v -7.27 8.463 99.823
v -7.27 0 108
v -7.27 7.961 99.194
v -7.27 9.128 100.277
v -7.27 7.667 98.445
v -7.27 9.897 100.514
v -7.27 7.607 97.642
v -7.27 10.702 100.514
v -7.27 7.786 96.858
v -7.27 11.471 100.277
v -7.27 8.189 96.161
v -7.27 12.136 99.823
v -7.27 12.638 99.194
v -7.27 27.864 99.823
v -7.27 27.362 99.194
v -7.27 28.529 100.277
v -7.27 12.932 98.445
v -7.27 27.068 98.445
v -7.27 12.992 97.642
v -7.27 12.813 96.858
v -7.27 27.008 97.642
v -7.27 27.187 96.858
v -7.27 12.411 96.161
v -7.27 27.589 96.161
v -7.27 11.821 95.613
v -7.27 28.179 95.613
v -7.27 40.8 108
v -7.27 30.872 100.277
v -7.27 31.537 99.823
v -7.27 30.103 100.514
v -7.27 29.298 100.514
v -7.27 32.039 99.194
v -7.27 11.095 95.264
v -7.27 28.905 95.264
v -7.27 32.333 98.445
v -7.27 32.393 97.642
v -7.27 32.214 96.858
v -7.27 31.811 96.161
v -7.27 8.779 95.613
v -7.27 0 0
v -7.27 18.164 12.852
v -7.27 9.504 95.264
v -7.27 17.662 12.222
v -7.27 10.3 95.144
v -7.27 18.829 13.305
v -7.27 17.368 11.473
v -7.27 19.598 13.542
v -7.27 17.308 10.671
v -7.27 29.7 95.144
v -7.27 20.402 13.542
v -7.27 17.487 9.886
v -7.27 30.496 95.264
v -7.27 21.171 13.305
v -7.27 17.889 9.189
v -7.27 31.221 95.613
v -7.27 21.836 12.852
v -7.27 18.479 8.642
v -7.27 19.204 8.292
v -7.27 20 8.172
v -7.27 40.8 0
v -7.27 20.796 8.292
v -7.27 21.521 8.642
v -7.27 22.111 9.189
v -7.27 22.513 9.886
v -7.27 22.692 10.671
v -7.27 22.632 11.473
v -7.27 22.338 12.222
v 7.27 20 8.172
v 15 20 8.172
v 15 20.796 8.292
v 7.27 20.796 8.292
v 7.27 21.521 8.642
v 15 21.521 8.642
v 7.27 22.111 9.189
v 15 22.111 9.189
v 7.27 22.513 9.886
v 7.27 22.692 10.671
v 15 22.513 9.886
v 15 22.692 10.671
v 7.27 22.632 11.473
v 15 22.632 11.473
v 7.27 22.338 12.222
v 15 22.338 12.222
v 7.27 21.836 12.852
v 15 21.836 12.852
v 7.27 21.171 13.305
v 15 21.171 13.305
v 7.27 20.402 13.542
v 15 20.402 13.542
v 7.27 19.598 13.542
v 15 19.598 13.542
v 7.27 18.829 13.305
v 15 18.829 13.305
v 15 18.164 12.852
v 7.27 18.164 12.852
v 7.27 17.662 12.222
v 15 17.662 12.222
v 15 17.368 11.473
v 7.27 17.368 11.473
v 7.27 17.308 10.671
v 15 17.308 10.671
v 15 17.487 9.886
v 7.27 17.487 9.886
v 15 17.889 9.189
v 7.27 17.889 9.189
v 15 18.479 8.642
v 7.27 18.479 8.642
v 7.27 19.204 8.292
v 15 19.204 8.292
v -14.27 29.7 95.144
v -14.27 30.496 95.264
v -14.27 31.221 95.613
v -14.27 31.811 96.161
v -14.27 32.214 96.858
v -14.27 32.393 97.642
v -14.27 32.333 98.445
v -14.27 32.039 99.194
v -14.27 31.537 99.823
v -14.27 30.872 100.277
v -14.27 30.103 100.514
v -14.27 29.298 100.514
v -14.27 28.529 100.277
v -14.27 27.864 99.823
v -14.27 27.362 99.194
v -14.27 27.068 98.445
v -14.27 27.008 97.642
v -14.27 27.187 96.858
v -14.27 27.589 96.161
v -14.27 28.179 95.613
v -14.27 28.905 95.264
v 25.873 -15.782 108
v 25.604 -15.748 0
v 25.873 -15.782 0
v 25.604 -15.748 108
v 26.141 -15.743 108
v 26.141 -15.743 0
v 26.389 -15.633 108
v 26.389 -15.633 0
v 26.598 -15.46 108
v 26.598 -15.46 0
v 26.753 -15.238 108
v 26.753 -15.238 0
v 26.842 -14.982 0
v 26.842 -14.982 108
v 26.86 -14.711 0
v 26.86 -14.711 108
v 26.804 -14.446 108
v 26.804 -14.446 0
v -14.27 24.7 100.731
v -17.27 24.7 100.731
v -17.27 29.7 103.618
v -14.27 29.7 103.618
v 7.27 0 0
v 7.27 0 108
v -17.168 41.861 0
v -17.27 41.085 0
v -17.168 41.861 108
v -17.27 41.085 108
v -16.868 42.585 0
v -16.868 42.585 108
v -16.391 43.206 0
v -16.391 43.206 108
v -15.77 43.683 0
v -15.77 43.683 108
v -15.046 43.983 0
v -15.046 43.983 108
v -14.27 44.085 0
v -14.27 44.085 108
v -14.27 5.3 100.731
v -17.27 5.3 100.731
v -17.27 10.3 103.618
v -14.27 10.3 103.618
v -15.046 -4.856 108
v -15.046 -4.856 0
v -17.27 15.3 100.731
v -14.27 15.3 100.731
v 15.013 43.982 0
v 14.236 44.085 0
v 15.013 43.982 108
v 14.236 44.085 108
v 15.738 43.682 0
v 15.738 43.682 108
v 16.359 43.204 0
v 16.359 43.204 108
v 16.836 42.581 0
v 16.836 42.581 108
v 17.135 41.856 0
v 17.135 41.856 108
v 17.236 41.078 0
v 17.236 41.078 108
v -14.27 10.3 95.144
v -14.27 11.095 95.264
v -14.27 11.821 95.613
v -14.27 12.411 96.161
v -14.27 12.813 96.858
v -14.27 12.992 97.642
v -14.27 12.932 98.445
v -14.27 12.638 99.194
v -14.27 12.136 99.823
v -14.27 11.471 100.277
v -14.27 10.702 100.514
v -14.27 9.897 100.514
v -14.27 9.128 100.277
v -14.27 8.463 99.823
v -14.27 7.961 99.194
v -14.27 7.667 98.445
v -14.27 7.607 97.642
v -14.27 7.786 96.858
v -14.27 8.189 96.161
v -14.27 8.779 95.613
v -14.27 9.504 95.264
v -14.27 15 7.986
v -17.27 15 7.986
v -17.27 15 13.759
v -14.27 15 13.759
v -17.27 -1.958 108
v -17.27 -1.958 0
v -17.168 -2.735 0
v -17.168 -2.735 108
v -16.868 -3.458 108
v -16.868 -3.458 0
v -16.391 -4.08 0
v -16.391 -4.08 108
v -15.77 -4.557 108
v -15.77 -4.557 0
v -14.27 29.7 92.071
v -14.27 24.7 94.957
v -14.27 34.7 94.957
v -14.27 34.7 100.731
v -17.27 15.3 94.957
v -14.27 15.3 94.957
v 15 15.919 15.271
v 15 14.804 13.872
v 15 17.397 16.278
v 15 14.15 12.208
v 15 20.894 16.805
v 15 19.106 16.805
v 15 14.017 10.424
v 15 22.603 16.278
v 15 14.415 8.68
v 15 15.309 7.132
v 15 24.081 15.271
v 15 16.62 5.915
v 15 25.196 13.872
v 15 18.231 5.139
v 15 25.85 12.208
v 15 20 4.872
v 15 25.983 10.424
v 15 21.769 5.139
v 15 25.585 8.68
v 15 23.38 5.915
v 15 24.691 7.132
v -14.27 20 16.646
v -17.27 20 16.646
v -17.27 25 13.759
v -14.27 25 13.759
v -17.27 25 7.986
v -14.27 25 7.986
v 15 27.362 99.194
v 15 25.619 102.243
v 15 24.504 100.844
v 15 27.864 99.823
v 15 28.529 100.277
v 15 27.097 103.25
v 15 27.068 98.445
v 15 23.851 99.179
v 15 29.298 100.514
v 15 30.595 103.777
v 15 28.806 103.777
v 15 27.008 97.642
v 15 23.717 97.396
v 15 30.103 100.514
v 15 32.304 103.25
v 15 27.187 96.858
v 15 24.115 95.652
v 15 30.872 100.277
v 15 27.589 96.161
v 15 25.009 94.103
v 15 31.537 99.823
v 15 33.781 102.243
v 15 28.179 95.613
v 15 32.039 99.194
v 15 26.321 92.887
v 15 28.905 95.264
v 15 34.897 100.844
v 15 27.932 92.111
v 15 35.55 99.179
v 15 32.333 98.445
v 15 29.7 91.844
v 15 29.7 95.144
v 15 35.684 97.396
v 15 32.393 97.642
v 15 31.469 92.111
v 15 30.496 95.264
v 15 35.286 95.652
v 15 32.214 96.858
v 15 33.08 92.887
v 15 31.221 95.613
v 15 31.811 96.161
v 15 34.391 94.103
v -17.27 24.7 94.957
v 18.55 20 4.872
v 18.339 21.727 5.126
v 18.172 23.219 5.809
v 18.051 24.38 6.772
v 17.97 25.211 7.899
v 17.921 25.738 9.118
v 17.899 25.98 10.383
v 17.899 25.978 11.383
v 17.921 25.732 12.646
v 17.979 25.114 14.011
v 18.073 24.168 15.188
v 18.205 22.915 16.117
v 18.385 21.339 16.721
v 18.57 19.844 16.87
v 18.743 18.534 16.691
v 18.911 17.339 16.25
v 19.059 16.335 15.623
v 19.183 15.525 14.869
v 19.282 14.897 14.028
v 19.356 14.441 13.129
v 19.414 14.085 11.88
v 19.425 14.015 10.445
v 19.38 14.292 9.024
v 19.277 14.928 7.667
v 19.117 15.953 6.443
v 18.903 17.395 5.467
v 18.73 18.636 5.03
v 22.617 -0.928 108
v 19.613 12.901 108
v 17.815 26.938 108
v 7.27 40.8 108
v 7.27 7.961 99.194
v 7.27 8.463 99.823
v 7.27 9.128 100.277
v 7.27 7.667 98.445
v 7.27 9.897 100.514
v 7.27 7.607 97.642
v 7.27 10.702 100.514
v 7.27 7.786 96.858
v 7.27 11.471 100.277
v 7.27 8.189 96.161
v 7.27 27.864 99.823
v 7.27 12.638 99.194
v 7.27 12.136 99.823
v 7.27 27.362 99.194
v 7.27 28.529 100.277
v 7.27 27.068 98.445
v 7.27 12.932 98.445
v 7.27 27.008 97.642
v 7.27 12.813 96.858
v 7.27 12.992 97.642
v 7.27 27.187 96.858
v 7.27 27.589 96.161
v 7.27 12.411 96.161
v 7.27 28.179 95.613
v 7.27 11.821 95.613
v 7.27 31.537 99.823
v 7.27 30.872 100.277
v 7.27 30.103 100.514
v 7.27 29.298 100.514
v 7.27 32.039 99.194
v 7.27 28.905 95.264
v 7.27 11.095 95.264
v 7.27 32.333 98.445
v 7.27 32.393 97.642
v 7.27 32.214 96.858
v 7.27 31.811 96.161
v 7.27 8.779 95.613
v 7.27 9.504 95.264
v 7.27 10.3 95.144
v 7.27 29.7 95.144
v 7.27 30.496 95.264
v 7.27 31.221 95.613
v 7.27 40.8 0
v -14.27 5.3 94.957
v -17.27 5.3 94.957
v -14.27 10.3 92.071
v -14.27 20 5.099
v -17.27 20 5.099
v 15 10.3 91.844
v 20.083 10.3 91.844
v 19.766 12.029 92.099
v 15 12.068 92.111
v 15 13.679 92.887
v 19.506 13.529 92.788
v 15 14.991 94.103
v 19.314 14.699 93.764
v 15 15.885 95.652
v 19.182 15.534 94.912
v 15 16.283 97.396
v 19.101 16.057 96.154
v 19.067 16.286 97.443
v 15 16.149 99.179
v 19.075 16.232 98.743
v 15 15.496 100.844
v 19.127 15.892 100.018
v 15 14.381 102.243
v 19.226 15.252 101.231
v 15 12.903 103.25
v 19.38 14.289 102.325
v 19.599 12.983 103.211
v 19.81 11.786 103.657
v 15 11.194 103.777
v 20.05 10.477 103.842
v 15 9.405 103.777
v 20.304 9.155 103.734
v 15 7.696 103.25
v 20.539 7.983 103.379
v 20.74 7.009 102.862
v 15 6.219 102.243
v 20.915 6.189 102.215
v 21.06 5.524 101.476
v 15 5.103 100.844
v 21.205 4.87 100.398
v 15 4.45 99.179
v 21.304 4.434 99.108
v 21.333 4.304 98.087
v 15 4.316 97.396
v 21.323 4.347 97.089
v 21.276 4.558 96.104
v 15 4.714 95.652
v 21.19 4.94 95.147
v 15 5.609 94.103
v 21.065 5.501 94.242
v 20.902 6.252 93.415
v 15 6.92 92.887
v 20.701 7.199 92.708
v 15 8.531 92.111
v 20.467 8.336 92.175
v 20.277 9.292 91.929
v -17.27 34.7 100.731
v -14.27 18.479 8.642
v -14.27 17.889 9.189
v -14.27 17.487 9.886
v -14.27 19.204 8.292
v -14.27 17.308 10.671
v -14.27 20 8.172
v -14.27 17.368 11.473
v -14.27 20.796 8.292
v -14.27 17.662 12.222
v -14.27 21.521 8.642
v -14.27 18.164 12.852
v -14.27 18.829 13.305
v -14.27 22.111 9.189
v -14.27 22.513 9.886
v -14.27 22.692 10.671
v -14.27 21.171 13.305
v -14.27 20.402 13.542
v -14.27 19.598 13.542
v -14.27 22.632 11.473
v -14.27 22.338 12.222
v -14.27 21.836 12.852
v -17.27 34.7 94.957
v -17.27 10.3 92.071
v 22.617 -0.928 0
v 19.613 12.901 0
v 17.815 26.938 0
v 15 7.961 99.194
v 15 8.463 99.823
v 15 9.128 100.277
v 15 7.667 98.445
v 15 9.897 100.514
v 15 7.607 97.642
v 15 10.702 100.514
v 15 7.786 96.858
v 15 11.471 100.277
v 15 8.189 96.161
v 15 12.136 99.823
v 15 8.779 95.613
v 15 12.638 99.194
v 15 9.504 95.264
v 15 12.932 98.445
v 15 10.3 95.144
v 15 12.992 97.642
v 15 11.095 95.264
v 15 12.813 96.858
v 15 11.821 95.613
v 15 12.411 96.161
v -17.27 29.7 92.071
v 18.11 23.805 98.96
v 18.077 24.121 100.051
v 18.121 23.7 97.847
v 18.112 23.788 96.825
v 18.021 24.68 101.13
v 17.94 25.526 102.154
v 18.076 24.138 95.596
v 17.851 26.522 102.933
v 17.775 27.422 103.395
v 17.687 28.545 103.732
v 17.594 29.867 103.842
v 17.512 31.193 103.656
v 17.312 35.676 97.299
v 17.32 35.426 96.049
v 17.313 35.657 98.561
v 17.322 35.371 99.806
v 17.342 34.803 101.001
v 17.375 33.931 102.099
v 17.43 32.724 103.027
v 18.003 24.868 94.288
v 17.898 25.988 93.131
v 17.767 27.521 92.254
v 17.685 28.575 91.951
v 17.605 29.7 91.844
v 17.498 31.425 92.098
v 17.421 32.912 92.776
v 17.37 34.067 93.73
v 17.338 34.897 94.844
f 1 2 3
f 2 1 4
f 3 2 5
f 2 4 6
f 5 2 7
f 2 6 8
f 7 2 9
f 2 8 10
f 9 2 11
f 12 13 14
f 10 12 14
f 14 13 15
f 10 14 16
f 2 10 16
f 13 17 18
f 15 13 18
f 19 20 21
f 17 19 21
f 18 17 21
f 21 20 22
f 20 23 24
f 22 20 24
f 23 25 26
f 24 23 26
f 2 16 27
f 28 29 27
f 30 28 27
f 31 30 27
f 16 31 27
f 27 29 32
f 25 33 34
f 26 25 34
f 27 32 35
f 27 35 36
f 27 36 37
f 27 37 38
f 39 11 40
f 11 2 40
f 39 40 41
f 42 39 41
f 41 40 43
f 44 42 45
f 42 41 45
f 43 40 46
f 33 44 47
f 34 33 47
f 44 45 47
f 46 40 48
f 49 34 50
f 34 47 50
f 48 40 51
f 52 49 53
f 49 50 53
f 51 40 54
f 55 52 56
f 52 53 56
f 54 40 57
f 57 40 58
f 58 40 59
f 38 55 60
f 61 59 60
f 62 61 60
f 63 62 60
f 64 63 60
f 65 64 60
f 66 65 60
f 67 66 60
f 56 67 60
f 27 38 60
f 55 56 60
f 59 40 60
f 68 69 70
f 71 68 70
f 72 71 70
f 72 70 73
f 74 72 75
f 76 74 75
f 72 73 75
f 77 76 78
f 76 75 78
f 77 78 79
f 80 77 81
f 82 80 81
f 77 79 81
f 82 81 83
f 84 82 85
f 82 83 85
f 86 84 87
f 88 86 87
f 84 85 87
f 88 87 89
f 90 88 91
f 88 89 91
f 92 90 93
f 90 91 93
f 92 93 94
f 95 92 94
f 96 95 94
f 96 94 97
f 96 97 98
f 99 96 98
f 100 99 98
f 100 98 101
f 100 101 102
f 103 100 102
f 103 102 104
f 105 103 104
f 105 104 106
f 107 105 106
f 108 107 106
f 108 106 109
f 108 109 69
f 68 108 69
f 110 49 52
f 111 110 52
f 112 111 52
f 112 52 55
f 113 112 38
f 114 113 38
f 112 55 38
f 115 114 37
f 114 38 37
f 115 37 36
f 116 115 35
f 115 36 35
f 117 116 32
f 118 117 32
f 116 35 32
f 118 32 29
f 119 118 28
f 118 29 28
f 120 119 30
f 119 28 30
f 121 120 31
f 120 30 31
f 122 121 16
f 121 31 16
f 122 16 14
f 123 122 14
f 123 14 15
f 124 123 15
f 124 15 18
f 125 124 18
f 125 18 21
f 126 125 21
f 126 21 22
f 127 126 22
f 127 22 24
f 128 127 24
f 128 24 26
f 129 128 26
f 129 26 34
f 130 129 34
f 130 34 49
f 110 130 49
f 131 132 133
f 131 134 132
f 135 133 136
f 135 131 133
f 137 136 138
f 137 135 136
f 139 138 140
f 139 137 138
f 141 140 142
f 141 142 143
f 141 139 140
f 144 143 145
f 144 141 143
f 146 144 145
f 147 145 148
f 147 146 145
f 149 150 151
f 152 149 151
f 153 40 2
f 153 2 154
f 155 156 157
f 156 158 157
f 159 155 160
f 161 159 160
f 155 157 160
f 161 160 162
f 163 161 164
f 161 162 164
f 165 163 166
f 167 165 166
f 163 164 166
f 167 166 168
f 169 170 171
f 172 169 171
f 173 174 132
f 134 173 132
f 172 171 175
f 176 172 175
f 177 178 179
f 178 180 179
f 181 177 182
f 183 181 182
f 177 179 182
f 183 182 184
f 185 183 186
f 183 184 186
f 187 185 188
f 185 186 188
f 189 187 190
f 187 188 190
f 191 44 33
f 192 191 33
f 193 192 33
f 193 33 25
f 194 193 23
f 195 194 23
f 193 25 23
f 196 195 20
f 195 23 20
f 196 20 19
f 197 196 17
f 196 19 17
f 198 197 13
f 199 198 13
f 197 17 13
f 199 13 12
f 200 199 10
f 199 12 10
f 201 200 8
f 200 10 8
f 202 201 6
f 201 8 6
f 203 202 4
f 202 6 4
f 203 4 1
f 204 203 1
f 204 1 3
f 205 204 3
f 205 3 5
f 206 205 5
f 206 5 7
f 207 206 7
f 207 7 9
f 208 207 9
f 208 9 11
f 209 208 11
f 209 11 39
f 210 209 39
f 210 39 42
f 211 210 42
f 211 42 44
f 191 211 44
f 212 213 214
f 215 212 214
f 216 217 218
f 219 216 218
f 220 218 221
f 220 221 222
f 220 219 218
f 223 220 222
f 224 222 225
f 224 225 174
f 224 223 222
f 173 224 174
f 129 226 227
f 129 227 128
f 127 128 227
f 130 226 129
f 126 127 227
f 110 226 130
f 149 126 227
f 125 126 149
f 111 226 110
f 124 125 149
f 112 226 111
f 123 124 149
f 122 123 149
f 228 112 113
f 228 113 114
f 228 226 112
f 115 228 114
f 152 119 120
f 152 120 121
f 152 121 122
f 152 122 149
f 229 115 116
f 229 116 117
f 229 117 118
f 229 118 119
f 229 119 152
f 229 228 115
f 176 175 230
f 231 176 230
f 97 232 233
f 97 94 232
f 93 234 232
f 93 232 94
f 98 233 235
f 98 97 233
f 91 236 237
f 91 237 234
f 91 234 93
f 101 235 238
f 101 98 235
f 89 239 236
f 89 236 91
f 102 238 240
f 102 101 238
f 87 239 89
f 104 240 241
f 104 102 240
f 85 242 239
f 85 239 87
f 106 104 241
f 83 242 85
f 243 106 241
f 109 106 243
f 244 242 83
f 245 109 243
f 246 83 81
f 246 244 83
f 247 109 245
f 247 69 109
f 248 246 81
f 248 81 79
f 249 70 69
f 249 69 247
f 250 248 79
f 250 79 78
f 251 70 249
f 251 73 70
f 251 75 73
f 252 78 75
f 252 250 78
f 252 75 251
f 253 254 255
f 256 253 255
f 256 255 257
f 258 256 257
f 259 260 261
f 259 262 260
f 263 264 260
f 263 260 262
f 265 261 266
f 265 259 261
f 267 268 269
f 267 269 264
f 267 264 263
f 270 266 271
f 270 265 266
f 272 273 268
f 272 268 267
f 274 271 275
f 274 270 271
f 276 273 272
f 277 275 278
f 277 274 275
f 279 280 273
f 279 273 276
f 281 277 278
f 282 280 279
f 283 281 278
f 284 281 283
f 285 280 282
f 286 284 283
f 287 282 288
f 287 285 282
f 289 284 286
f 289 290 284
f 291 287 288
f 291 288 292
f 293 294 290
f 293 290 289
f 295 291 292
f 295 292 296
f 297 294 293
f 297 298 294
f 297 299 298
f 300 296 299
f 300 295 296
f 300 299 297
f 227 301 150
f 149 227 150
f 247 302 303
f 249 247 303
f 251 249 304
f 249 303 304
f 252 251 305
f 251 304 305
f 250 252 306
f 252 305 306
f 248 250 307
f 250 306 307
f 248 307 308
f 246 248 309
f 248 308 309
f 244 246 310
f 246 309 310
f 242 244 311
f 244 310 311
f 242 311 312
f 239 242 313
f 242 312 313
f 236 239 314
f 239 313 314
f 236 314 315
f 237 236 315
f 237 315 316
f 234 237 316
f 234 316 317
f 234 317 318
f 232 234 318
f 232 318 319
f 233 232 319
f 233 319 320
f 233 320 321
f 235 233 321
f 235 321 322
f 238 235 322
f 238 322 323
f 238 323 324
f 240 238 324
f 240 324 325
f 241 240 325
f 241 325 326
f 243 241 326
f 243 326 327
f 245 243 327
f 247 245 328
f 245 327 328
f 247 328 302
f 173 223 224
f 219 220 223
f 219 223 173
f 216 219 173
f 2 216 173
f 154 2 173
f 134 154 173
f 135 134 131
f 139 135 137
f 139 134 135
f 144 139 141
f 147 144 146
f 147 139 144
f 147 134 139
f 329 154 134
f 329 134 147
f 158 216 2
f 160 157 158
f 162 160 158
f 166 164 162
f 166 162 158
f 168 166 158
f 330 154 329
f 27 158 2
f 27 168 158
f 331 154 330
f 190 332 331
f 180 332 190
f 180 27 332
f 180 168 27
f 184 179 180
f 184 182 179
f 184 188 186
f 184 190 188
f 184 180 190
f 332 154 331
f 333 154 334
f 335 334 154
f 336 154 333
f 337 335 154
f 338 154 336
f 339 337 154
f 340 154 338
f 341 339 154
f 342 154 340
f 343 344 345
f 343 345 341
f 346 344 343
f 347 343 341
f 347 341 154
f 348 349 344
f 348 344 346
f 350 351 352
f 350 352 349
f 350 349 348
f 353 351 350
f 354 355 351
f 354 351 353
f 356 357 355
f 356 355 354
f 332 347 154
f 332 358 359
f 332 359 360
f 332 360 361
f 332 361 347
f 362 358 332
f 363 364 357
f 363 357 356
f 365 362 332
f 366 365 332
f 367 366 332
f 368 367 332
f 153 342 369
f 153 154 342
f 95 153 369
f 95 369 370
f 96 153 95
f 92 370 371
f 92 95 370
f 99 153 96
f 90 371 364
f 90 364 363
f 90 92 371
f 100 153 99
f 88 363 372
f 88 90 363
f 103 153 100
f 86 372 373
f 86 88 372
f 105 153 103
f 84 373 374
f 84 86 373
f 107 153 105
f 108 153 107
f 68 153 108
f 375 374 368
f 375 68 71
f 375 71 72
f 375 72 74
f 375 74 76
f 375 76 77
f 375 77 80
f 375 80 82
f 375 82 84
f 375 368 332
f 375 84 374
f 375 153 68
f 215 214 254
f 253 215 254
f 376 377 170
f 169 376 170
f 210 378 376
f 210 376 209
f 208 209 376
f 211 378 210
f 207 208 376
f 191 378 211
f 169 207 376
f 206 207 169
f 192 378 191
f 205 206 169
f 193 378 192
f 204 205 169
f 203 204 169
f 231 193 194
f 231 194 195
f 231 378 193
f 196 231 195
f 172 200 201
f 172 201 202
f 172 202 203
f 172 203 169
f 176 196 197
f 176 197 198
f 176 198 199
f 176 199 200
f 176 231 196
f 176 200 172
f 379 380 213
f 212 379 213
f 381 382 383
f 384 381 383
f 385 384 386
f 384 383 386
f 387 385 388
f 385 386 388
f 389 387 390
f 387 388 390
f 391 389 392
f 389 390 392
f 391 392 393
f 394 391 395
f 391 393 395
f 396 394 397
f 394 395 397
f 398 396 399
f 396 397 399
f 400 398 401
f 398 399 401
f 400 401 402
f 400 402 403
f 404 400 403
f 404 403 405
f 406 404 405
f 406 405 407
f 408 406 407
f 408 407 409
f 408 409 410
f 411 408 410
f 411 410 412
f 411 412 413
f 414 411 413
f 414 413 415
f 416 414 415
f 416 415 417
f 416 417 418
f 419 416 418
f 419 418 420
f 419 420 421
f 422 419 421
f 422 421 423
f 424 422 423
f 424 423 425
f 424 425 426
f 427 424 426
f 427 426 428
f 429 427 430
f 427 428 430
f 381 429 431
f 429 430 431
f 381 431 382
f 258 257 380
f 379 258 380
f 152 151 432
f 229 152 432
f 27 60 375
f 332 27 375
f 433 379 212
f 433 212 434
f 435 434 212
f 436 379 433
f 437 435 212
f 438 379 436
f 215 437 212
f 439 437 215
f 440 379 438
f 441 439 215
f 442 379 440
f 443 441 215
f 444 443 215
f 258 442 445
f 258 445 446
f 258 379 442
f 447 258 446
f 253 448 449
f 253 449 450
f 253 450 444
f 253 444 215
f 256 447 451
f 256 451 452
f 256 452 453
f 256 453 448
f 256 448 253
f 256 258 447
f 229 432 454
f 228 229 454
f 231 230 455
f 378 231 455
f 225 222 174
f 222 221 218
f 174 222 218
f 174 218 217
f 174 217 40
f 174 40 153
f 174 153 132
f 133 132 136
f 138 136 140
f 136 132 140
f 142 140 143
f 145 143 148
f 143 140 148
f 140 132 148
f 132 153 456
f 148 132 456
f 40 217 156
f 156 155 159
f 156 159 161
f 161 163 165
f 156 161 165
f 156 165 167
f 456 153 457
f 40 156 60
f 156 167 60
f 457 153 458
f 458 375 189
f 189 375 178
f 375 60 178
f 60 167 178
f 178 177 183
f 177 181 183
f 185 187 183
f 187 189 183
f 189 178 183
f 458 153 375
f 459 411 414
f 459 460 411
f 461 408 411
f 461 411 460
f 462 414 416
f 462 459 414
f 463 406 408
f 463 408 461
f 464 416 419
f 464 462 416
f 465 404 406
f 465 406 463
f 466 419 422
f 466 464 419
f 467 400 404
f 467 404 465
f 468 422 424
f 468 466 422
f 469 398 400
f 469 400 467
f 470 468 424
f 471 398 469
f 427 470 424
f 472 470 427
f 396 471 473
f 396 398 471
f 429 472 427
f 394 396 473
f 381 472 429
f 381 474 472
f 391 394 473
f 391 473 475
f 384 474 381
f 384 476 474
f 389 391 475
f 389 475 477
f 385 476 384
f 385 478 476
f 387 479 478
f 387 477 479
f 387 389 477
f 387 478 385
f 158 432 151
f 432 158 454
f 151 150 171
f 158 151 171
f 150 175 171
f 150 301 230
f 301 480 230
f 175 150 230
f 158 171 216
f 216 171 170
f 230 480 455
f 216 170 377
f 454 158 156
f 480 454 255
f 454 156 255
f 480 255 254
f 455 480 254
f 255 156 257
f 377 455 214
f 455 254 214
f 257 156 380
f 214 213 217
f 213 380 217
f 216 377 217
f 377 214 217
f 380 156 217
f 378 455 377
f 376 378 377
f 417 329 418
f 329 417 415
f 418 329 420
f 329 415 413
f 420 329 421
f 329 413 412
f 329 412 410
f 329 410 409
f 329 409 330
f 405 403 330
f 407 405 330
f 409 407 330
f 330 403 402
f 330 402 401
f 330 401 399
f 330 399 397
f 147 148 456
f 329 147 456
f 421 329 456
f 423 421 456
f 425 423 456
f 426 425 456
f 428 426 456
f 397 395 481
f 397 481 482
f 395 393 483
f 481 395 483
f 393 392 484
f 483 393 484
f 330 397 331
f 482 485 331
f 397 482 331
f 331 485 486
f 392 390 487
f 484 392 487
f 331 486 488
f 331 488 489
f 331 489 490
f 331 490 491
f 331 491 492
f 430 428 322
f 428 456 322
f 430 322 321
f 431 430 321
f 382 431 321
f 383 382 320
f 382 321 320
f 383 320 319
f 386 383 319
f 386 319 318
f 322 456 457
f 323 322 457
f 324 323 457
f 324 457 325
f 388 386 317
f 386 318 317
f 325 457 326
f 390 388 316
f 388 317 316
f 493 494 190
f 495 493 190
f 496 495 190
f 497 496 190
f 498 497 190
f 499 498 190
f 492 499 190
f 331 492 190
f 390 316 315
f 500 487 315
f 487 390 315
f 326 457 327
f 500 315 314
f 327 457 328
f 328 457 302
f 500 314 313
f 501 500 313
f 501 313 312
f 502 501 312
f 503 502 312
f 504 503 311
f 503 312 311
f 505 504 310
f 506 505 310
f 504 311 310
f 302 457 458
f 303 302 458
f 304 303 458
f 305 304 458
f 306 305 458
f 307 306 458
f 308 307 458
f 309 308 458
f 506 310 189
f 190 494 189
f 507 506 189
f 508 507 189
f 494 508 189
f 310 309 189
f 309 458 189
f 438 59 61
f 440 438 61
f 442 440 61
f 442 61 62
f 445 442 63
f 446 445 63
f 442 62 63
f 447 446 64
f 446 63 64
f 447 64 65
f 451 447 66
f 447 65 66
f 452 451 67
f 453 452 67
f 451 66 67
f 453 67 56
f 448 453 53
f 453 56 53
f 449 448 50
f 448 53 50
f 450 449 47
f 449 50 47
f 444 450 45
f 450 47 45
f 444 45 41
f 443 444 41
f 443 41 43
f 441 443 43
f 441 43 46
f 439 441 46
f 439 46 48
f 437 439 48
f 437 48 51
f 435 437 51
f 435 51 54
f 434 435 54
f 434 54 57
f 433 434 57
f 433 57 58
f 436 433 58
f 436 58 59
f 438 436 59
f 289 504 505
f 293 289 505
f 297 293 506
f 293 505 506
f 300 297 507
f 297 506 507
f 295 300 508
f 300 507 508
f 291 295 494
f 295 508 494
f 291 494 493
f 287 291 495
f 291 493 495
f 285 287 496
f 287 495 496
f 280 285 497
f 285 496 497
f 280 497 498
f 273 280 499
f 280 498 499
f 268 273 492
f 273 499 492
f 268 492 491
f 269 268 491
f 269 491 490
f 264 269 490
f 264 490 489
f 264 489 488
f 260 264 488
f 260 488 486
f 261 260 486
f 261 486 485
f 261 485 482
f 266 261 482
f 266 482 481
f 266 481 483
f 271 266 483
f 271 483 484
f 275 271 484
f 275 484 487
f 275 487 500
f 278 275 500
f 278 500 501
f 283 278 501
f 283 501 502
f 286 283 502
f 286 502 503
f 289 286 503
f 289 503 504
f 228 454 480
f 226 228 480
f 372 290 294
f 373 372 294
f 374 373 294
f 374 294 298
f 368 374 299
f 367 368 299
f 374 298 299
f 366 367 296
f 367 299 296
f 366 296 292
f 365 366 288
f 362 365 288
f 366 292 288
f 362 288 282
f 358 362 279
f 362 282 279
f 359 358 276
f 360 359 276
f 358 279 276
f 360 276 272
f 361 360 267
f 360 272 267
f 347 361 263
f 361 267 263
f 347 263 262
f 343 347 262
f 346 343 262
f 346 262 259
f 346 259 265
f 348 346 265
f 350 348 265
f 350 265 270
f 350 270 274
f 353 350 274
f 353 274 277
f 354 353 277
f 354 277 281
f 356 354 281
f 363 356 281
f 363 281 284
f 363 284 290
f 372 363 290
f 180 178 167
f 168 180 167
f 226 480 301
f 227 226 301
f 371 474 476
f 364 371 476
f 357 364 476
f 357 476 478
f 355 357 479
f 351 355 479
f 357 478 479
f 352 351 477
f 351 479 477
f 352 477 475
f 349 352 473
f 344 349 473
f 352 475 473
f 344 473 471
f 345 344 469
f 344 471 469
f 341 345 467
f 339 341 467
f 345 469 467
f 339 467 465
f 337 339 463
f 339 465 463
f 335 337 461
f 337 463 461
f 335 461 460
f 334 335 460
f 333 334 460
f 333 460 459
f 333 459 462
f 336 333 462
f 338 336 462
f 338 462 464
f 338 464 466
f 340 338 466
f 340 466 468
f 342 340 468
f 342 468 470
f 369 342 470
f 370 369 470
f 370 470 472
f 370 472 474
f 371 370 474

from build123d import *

# Parameters (mm, degrees)
ESQUISSE1_W             = 14.54
ESQUISSE1_H             = 40.8
BOSS_EXTRU_1_DEPTH      = 108
D_GAGEMENT_M1_62_D      = 5.4
CONG_1_R                = 3
CONG_2_R                = 1
ESQUISSE6_R             = 6
ENL_V_MAT_EXTRU_1_DEPTH = 15
ENL_V_MAT_EXTRU_2_DEPTH = 3


with BuildPart() as part:
    # Esquisse1 → Boss.-Extru.1 (new body)
    with BuildSketch(Plane.XY):
        with BuildLine():
            Line((-17.27, 44.084778495), (-17.27, -4.260431004))
            Line((-17.27, -4.260431004), (27.460015919, -16.245802647))
            ThreePointArc((27.460015919, -16.245802647), (19.521650941, 13.439236404), (17.27, 44.084778495))
            Line((17.27, 44.084778495), (-17.27, 44.084778495))
        make_face()
        with Locations((0, 20.4)):
            Rectangle(ESQUISSE1_W, ESQUISSE1_H, mode=Mode.SUBTRACT)
    extrude(amount=BOSS_EXTRU_1_DEPTH)

    # Dégagement M1.62 (through all)
    with Locations(Plane.ZY.offset(17.27)):
        with Locations((10.872493666, 20), (97.844217786, 29.700422986), (97.844217786, 10.299577014)):
            Hole(D_GAGEMENT_M1_62_D / 2)

    # Congé1
    cong_1_edges = [part.edges().sort_by_distance(p)[0] for p in [
        (17.27, 44.084778495, 54),
        (-17.27, -4.260431004, 54),
        (-17.27, 44.084778495, 54),
    ]]
    fillet(cong_1_edges, radius=CONG_1_R)

    # Congé2
    cong_2_edges = [part.edges().sort_by_distance(p)[0] for p in [
        (27.460015919, -16.245802647, 54),
    ]]
    fillet(cong_2_edges, radius=CONG_2_R)

    # Esquisse6 → Enlèv. mat.-Extru.1 (cut)
    with BuildSketch(Plane(origin=(30, 0, 0), x_dir=(0, 0, -1), z_dir=(1, 0, 0))):
        with Locations((-10.872493666, 20)):
            Circle(ESQUISSE6_R)
        with Locations((-97.844217786, 29.700422986)):
            Circle(ESQUISSE6_R)
        with Locations((-97.844217786, 10.299577014)):
            Circle(ESQUISSE6_R)
    extrude(amount=-ENL_V_MAT_EXTRU_1_DEPTH, mode=Mode.SUBTRACT)

    # Esquisse7 → Enlèv. mat.-Extru.2 (cut)
    with BuildSketch(Plane.ZY.offset(17.27)):
        Polygon((13.759245012, 15), (16.645996358, 20), (13.759245012, 25), (7.98574232, 25), (5.098990974, 20), (7.98574232, 15), align=None)
        Polygon((100.730969132, 24.700422986), (103.617720477, 29.700422986), (100.730969132, 34.700422986), (94.95746644, 34.700422986), (92.070715094, 29.700422986), (94.95746644, 24.700422986), align=None)
        Polygon((100.730969132, 5.299577014), (103.617720477, 10.299577014), (100.730969132, 15.299577014), (94.95746644, 15.299577014), (92.070715094, 10.299577014), (94.95746644, 5.299577014), align=None)
    extrude(amount=-ENL_V_MAT_EXTRU_2_DEPTH, mode=Mode.SUBTRACT)


solid = part.part
